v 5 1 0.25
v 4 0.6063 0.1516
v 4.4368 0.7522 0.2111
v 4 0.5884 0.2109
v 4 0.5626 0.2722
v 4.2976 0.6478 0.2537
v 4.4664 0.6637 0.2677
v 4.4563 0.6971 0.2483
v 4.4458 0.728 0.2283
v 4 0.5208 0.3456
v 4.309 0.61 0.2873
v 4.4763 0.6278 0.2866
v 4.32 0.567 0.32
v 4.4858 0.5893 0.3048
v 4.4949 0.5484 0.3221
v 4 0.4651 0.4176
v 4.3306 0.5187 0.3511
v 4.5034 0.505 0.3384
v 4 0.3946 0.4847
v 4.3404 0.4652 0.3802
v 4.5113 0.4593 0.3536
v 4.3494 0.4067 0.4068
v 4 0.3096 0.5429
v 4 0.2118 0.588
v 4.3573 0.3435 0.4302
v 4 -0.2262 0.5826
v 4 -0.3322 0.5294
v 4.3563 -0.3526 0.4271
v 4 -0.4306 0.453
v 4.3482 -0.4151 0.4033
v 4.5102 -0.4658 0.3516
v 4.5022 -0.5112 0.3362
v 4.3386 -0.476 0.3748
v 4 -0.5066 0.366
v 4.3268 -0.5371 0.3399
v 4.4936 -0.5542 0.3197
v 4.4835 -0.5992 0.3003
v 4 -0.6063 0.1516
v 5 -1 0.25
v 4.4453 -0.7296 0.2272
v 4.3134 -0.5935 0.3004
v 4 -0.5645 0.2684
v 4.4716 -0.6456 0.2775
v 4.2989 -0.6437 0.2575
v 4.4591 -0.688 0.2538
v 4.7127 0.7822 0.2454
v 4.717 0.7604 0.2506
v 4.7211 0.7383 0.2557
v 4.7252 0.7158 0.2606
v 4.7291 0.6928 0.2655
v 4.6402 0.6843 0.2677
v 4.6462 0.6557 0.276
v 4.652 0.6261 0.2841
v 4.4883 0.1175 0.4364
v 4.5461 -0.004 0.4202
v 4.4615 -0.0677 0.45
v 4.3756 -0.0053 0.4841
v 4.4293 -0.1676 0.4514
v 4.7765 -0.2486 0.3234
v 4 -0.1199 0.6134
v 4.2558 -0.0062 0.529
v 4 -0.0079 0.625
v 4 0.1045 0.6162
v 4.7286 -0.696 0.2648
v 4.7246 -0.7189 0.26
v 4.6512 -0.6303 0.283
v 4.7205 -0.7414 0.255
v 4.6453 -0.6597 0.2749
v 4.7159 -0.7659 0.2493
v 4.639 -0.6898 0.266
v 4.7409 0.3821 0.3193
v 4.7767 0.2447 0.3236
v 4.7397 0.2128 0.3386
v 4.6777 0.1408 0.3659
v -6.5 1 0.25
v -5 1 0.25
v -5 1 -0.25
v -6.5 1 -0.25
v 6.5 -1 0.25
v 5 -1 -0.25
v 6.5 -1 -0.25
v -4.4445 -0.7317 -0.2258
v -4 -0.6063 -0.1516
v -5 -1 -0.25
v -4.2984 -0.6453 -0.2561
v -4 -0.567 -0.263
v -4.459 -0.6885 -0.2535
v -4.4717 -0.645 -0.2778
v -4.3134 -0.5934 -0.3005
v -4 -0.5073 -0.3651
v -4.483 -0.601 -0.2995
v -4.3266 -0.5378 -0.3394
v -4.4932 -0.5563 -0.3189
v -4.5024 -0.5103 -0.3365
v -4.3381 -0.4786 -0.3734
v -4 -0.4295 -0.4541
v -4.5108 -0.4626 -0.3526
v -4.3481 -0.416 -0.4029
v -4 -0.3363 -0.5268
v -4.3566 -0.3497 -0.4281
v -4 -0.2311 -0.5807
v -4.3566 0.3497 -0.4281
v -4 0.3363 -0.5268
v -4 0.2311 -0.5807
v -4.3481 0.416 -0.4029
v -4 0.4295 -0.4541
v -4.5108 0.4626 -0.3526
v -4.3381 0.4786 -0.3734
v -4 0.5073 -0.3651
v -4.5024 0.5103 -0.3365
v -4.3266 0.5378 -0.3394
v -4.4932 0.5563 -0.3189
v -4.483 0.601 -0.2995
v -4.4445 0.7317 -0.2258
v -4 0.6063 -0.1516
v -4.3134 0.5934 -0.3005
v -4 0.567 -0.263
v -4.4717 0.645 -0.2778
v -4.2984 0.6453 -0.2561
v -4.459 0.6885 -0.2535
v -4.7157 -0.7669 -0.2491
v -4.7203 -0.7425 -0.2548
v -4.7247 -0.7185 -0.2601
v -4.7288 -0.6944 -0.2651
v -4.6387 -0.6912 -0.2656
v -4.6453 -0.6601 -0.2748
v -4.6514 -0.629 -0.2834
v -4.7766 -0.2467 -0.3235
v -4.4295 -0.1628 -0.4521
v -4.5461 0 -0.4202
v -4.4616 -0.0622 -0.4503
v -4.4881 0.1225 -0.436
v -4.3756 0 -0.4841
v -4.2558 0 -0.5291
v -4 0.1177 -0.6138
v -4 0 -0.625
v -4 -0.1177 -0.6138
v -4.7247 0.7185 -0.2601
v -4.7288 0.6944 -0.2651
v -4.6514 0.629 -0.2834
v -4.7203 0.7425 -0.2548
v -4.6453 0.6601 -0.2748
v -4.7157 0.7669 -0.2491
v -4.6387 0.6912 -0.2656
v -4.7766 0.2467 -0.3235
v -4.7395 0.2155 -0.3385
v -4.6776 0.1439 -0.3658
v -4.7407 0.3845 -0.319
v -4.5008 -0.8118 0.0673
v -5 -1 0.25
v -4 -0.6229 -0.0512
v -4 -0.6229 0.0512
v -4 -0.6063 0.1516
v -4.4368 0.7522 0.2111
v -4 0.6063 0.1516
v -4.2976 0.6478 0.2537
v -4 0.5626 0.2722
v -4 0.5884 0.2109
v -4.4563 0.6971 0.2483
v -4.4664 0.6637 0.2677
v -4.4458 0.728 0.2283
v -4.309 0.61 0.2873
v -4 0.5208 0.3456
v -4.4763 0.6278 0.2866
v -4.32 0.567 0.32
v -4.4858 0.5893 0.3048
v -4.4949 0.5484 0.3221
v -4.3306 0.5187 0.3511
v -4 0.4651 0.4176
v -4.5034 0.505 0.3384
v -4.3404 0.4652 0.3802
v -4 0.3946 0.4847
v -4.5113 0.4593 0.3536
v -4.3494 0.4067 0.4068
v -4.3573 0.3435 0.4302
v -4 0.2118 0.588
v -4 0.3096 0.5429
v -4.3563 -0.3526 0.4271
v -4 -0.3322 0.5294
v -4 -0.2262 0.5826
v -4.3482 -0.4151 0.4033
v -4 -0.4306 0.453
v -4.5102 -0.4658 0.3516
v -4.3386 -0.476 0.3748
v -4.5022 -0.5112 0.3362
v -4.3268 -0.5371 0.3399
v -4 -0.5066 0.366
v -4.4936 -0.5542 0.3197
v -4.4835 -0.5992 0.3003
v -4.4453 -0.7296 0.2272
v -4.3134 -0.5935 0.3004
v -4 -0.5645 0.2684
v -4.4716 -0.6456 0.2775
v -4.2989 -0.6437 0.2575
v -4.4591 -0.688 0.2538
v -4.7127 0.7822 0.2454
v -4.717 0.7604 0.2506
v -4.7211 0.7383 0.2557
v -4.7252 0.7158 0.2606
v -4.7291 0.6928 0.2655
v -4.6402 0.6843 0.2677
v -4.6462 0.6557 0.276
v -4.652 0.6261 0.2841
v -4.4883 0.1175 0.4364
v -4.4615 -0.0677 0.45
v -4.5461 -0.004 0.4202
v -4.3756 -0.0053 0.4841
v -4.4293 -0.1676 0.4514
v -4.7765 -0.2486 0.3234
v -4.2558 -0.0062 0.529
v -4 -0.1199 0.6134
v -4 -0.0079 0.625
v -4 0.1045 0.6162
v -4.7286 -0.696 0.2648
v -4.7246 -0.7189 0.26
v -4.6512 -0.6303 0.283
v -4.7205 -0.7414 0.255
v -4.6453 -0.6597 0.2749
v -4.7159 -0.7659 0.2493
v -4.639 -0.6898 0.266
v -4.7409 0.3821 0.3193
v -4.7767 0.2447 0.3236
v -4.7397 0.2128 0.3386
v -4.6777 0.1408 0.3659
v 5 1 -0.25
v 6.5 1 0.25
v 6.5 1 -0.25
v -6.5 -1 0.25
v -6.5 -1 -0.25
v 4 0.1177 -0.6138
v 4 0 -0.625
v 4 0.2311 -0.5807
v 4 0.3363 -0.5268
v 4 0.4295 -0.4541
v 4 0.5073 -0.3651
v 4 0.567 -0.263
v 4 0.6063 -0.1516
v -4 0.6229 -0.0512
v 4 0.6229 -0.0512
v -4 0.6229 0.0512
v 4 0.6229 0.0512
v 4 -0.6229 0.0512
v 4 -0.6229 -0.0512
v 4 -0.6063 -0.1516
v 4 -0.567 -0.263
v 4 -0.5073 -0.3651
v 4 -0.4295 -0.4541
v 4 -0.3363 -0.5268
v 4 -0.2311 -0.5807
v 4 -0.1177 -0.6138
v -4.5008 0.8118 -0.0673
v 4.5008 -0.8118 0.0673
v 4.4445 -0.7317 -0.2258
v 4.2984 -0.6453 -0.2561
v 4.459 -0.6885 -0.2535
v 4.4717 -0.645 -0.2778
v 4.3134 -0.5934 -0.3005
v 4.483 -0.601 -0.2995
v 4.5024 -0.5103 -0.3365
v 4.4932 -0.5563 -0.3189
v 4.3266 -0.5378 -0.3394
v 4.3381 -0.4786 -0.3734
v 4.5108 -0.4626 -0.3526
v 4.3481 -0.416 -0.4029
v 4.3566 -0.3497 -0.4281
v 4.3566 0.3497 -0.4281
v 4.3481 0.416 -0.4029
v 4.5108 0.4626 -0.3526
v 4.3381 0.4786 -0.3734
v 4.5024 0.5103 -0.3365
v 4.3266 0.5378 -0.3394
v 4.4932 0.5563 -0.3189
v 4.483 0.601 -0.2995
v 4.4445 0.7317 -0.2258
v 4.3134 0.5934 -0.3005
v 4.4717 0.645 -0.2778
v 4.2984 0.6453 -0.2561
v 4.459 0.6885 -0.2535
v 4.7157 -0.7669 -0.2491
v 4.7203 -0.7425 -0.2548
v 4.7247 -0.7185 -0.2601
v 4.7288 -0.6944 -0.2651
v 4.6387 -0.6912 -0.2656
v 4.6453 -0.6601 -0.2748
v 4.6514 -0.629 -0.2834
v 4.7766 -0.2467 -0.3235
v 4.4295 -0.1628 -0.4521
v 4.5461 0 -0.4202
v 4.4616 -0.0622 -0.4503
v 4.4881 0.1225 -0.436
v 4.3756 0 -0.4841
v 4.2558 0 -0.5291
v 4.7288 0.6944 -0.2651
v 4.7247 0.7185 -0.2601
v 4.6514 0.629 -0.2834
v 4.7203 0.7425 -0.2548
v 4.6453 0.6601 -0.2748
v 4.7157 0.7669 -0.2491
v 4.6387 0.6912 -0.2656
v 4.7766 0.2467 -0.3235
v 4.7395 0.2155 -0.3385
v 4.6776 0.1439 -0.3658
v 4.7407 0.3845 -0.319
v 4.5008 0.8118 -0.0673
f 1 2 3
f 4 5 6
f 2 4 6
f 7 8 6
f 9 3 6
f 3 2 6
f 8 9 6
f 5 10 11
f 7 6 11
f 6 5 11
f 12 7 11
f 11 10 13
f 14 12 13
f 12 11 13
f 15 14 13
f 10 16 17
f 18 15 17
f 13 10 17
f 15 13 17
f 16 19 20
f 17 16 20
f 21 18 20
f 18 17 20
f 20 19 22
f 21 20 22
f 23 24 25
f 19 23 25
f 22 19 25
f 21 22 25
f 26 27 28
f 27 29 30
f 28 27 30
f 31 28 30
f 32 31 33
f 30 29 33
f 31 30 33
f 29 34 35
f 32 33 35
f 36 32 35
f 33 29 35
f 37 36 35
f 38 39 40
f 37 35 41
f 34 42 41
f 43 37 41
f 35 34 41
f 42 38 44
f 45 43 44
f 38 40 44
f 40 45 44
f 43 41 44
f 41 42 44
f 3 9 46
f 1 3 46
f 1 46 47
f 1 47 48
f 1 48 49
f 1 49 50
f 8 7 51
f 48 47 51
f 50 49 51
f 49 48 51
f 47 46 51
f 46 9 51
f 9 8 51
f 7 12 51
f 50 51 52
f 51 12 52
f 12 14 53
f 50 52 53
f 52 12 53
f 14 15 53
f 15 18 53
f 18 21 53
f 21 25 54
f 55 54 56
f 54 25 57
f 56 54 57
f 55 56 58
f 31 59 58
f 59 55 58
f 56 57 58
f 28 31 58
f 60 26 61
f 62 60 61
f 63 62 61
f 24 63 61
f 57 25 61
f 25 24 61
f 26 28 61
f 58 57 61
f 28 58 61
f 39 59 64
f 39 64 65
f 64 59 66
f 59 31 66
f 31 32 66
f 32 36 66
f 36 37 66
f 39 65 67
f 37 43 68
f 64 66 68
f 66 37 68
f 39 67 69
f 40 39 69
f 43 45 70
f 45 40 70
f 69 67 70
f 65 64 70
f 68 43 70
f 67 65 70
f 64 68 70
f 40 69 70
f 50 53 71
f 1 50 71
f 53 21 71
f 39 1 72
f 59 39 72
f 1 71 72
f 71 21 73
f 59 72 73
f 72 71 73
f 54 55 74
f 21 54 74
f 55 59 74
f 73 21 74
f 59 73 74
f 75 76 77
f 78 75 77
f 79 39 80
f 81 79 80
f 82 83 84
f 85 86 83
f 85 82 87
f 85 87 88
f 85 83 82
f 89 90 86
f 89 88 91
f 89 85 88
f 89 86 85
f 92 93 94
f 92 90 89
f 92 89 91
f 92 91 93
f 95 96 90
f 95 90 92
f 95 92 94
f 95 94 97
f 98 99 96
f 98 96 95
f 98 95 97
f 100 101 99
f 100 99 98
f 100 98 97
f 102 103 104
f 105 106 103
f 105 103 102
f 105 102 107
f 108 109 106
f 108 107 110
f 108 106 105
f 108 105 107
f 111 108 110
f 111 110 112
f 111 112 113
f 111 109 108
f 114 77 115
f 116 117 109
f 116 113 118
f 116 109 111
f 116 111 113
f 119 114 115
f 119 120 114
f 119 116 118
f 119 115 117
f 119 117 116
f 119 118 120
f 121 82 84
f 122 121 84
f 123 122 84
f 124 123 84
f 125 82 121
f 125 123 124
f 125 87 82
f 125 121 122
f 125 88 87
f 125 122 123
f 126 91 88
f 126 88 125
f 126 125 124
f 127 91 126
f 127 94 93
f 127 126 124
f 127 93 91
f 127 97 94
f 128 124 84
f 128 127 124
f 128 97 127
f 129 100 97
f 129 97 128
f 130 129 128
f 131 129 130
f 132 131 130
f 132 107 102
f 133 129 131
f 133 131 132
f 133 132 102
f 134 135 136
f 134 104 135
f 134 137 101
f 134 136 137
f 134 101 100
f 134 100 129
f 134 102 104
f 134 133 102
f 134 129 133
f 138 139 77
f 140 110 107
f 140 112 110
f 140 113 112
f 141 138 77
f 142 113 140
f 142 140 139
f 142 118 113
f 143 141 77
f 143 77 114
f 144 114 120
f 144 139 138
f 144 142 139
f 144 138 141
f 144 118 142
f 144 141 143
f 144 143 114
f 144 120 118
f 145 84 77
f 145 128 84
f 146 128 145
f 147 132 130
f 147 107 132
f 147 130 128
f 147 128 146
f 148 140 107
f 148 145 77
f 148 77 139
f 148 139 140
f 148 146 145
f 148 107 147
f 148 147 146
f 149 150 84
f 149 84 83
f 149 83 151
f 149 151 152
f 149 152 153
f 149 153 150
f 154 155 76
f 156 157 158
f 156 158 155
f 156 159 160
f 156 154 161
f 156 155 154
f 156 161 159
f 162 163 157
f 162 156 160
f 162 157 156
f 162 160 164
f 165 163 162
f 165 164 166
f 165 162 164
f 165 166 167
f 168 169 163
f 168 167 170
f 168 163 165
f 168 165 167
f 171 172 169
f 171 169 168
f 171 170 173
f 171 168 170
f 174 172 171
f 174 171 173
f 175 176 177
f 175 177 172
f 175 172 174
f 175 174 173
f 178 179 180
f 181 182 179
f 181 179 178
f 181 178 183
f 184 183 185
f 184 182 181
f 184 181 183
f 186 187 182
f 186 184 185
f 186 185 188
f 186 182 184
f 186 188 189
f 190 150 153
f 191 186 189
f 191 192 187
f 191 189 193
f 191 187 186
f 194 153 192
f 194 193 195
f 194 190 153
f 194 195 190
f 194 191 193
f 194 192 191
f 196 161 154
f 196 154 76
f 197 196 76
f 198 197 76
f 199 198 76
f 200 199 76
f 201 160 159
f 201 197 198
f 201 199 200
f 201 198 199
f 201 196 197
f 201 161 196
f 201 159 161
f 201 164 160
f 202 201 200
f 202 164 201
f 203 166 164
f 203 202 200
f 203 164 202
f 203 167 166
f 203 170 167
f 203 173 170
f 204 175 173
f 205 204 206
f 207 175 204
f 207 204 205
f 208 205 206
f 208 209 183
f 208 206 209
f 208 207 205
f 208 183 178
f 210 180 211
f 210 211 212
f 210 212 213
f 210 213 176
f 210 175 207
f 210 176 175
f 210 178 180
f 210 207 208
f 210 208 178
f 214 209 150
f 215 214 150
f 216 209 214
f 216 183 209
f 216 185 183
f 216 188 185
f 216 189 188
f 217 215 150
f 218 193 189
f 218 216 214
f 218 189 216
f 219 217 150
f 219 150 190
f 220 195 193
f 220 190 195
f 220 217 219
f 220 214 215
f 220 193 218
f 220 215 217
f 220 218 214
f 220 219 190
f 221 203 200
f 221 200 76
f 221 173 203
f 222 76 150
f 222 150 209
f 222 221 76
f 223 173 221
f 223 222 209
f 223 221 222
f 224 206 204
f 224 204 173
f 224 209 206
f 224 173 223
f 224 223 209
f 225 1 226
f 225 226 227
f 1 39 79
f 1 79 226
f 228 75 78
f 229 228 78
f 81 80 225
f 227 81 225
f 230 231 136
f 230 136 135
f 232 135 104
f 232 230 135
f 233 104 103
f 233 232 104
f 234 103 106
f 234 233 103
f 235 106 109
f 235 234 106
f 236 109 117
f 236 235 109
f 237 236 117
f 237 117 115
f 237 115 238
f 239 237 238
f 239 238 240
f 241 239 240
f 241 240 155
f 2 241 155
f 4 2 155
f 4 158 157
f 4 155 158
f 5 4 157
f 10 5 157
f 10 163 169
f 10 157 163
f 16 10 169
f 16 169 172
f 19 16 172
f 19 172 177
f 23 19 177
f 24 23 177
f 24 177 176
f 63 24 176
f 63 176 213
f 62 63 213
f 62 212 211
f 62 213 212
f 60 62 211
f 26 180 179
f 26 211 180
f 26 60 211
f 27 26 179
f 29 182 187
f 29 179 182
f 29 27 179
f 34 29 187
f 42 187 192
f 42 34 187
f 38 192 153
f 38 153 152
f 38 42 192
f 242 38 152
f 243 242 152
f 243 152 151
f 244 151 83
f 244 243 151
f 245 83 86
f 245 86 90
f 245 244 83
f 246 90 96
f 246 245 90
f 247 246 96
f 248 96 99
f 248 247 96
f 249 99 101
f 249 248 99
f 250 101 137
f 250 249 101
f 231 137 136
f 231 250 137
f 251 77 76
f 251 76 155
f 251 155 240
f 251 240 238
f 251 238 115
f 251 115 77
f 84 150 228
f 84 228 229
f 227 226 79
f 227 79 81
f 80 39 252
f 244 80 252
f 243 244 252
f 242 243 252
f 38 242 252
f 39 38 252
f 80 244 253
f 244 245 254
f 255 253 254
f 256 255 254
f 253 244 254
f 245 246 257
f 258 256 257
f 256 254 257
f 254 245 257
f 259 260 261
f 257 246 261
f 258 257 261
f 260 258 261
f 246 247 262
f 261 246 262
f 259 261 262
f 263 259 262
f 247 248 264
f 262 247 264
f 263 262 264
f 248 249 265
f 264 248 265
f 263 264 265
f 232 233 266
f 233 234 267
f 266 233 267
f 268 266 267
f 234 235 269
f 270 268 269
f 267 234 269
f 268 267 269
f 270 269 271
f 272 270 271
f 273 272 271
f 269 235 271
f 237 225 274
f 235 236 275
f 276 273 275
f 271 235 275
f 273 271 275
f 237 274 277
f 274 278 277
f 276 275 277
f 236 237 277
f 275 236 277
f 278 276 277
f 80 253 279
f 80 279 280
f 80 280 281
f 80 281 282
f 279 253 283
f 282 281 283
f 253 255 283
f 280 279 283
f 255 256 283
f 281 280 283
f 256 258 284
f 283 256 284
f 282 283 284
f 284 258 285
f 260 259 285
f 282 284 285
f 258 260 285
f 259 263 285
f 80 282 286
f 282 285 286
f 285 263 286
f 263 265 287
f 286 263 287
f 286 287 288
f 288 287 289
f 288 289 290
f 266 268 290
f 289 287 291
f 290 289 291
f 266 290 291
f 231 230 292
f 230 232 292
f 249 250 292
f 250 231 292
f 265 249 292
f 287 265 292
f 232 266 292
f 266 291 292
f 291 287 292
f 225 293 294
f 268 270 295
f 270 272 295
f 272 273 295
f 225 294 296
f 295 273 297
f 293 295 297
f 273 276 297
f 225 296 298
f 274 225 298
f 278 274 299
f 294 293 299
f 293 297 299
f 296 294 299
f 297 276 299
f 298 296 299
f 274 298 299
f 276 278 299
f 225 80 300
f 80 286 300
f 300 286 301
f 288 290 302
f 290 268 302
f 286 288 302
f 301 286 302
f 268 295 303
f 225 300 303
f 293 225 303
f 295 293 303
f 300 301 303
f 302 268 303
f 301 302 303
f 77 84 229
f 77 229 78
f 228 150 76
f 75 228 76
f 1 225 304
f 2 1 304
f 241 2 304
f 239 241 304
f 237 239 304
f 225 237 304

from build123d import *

# Parameters (mm, degrees)
SKETCH1_R           = 0.625
BOSS_EXTRUDE1_DEPTH = 4
SKETCH2_W           = 0.5
SKETCH2_H           = 2
SKETCH4_W           = 0.5
SKETCH4_H           = 2
BOSS_EXTRUDE2_DEPTH = 1.5


with BuildPart() as part:
    # Sketch1 → Boss-Extrude1 (new, symmetric)
    with BuildSketch(Plane(origin=(0, 0, 0), x_dir=(0, 0, -1), z_dir=(1, 0, 0))):
        Circle(SKETCH1_R)
    extrude(amount=BOSS_EXTRUDE1_DEPTH, both=True)

    # Sketch2 → Loft1 section 0
    with BuildSketch(Plane(origin=(5, 0, 0), x_dir=(0, 0, -1), z_dir=(1, 0, 0))):
        Rectangle(SKETCH2_W, SKETCH2_H)
    # Sketch3 for Loft1 → Loft1 section 1
    with BuildSketch(Plane(origin=(4, 0, 0), x_dir=(0, 0, -1), z_dir=(1, 0, 0))):
        with BuildLine():
            # circular arc as an exact rational Bezier (weights 1, cos(half-angle), 1)
            Bezier((0.151584766, -0.606339063), (0, -0.644235254), (-0.151584766, -0.606339063), weights=[1, 0.970142502, 1])
            Bezier((-0.151584766, -0.606339063), (-2.576941004, 0), (-0.151584766, 0.606339063), weights=[1, 0.242535626, 1])
            Bezier((-0.151584766, 0.606339063), (0, 0.644235254), (0.151584766, 0.606339063), weights=[1, 0.970142502, 1])
            Bezier((0.151584766, 0.606339063), (2.576941004, 0), (0.151584766, -0.606339063), weights=[1, 0.242535626, 1])
        make_face()
    loft1 = loft()

    # Sketch4 → Boss-Extrude2 (add)
    with BuildSketch(Plane(origin=(5, 0, 0), x_dir=(0, 0, -1), z_dir=(1, 0, 0))):
        Rectangle(SKETCH4_W, SKETCH4_H)
    boss_extrude2 = extrude(amount=BOSS_EXTRUDE2_DEPTH)

    # Mirror1: Loft1, Boss-Extrude2 across plane
    add(loft1.mirror(Plane(origin=(0, 0, 0), x_dir=(0, 0, 1), z_dir=(1, 0, 0))))
    add(boss_extrude2.mirror(Plane(origin=(0, 0, 0), x_dir=(0, 0, 1), z_dir=(1, 0, 0))))


solid = part.part
